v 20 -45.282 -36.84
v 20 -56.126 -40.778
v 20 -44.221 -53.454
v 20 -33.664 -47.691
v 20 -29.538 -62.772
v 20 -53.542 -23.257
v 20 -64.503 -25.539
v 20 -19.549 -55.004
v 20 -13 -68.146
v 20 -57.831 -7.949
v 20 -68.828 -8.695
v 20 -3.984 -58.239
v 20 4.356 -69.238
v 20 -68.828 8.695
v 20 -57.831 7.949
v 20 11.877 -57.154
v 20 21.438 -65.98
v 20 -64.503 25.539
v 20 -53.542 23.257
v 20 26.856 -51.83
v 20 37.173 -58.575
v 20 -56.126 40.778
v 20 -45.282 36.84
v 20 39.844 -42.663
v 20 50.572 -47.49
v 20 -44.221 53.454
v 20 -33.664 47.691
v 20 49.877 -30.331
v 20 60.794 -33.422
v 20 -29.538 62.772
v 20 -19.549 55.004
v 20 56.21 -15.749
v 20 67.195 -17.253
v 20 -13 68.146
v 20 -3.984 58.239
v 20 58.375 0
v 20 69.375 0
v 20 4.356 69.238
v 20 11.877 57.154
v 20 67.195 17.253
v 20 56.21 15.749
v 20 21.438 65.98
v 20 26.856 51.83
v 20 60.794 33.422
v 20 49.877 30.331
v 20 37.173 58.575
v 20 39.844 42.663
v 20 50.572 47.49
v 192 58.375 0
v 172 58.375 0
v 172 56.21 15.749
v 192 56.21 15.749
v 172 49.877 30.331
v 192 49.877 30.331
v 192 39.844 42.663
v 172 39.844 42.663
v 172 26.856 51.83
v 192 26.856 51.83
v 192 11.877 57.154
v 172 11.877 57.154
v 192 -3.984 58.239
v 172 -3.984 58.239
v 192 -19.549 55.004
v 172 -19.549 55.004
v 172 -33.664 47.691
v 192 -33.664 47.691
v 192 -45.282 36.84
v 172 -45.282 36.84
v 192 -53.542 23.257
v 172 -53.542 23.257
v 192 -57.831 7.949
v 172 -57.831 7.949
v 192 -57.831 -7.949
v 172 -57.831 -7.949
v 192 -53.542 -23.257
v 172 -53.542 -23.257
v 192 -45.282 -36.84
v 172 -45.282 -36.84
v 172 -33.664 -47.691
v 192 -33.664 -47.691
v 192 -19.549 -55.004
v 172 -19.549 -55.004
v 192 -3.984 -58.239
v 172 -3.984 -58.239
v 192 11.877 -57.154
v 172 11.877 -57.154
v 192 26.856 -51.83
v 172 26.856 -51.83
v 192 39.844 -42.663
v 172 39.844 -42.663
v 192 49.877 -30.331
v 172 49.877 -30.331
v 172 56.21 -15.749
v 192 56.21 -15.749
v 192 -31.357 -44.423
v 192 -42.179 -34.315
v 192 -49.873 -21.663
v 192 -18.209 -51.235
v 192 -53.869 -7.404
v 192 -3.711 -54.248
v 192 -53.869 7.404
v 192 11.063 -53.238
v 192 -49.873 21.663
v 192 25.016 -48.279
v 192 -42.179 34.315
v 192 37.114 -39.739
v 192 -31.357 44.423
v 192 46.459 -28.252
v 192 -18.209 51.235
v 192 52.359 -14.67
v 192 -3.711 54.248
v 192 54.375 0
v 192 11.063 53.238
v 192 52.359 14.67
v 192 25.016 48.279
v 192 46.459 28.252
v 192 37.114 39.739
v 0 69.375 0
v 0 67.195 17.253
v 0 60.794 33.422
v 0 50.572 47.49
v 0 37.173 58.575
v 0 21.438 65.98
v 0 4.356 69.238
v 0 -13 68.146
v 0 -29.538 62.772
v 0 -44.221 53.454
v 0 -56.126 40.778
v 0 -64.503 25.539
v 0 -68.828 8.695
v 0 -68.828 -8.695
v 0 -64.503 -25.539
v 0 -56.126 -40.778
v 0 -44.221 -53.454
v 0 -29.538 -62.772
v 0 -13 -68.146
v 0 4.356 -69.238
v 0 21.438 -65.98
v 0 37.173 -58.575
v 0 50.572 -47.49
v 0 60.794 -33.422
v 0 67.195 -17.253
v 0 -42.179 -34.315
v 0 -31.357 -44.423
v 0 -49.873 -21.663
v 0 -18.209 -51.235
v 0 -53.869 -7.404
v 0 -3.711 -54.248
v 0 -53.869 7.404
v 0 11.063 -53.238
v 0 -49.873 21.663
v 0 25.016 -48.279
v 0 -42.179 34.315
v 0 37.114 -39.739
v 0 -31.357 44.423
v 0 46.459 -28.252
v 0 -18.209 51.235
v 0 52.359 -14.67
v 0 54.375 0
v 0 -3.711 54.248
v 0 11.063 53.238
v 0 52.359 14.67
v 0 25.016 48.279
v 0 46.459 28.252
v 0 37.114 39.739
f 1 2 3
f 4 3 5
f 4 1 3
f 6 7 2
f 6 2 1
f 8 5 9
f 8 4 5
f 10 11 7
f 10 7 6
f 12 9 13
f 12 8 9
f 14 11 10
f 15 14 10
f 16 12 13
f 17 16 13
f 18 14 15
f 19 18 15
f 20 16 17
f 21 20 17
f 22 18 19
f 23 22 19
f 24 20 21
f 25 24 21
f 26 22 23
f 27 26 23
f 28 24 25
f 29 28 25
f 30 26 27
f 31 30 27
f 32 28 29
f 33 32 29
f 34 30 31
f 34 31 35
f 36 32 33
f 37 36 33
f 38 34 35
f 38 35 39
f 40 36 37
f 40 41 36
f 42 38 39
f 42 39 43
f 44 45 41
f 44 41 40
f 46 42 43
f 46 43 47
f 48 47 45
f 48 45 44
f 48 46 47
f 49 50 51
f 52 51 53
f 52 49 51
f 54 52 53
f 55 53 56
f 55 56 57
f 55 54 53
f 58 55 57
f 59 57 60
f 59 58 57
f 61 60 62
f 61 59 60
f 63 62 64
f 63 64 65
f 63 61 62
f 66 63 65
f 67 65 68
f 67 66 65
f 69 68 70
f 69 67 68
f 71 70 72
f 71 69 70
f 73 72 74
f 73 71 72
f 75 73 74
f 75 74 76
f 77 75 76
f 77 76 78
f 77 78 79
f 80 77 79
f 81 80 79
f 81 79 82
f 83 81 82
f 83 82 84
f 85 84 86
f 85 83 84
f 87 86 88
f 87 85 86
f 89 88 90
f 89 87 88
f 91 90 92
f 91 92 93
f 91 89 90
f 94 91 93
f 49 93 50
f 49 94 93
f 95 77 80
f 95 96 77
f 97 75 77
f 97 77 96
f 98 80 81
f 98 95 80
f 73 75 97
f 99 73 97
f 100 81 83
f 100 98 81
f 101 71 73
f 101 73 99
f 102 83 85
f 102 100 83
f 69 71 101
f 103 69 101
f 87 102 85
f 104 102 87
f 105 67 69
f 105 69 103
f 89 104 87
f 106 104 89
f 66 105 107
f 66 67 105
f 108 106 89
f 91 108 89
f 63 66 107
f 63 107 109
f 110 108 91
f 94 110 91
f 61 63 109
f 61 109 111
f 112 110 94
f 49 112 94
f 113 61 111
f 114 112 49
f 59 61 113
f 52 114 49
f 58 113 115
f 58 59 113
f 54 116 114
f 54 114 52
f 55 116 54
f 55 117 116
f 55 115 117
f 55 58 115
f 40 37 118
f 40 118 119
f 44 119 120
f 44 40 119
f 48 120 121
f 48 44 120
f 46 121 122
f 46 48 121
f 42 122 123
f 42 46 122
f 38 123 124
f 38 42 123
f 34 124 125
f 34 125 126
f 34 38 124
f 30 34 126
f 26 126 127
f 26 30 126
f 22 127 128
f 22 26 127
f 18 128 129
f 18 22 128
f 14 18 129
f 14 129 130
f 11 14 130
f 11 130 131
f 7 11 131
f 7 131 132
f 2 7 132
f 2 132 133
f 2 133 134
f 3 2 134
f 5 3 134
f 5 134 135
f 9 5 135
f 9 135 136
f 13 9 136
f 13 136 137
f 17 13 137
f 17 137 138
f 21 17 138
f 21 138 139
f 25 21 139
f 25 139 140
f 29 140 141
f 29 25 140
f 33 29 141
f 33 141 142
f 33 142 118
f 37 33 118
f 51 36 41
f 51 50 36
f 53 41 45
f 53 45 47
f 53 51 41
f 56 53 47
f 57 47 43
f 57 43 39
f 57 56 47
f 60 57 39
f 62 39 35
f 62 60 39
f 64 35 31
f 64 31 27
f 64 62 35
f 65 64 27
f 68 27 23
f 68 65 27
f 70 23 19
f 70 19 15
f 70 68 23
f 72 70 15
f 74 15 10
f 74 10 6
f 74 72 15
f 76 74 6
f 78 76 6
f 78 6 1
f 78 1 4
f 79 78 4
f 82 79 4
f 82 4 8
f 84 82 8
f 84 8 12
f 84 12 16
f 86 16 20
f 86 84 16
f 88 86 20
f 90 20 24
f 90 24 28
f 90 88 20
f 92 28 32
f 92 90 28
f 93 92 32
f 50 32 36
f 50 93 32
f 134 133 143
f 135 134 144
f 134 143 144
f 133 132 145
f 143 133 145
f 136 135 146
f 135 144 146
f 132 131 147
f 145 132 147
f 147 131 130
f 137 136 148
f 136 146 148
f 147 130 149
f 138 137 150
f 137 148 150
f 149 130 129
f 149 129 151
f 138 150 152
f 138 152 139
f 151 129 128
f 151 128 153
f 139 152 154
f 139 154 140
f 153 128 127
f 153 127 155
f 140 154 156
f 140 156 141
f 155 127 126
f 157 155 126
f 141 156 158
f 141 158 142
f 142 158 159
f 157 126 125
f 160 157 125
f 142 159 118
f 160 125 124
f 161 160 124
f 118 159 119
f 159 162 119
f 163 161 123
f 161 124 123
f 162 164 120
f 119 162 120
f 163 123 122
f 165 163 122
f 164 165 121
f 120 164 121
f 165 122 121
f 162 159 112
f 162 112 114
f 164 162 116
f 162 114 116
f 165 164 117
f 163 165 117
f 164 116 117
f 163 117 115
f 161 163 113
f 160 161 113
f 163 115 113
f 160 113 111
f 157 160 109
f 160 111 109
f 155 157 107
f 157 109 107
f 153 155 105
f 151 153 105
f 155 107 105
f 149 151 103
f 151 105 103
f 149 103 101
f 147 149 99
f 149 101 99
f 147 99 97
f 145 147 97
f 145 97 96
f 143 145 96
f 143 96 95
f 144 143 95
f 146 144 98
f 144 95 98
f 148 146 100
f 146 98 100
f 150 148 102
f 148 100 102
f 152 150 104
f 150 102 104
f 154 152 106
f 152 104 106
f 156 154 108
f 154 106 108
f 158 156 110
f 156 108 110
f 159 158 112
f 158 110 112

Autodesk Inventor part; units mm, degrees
ref_plane "YZ Plane" through (0, 0, 0) normal (1, 0, 0) x (0, 1, 0)
ref_plane "XZ Plane" through (0, 0, 0) normal (0, 1, 0) x (-1, 0, 0)
ref_plane "XY Plane" through (0, 0, 0) normal (0, 0, 1) x (1, 0, 0)
sketch "Sketch1" plane through (0, 0, 0) normal (0, 0, 1) x (1, 0, 0)
  line L0 (0, 0) -> (0, 54.375)
  line L1 (0, 54.375) -> (192, 54.375)
  line L2 (0, 0) -> (772.3927, 0)
  line L3 (253.9225, 18.624) -> (253.9225, 0) construction
  line L4 (192, 54.375) -> (253.9225, 18.624)
  line L5 (253.9225, 18.624) -> (256.9225, 18.624)
  line L6 (256.9225, 18.624) -> (325.3908, 36.97)
  line L7 (325.3908, 36.97) -> (325.3908, 0)
  line L8 (192, 54.375) -> (192, 0)
  line L9 (0, 54.375) -> (0, 69.375)
  line L10 (0, 69.375) -> (20, 69.375)
  line L11 (20, 69.375) -> (20, 58.375)
  line L12 (192, 54.375) -> (192, 74.375)
  line L13 (20, 58.375) -> (172, 58.375)
  line L14 (172, 58.375) -> (192, 58.375)
  dimension "d9" = 54.375
  dimension "d10" = 192
  dimension "d12" = 18.624
  dimension "d13" = 150
  dimension "d15" = 3
  dimension "d16" = 15
  dimension "d17" = 36.97
  dimension "d18" = 518.4701
  dimension "d19" = 15
  dimension "d20" = 20
  dimension "d21" = 11
revolve "Revolution2" add sketch "Sketch1" angle 360 about axis through (0, 0, 0) along (1, 0, 0) contours L9 L10 L11 L13 L14 L12 L1
properties part number "combustion chamber" material "Stainless Steel, Austenitic"
